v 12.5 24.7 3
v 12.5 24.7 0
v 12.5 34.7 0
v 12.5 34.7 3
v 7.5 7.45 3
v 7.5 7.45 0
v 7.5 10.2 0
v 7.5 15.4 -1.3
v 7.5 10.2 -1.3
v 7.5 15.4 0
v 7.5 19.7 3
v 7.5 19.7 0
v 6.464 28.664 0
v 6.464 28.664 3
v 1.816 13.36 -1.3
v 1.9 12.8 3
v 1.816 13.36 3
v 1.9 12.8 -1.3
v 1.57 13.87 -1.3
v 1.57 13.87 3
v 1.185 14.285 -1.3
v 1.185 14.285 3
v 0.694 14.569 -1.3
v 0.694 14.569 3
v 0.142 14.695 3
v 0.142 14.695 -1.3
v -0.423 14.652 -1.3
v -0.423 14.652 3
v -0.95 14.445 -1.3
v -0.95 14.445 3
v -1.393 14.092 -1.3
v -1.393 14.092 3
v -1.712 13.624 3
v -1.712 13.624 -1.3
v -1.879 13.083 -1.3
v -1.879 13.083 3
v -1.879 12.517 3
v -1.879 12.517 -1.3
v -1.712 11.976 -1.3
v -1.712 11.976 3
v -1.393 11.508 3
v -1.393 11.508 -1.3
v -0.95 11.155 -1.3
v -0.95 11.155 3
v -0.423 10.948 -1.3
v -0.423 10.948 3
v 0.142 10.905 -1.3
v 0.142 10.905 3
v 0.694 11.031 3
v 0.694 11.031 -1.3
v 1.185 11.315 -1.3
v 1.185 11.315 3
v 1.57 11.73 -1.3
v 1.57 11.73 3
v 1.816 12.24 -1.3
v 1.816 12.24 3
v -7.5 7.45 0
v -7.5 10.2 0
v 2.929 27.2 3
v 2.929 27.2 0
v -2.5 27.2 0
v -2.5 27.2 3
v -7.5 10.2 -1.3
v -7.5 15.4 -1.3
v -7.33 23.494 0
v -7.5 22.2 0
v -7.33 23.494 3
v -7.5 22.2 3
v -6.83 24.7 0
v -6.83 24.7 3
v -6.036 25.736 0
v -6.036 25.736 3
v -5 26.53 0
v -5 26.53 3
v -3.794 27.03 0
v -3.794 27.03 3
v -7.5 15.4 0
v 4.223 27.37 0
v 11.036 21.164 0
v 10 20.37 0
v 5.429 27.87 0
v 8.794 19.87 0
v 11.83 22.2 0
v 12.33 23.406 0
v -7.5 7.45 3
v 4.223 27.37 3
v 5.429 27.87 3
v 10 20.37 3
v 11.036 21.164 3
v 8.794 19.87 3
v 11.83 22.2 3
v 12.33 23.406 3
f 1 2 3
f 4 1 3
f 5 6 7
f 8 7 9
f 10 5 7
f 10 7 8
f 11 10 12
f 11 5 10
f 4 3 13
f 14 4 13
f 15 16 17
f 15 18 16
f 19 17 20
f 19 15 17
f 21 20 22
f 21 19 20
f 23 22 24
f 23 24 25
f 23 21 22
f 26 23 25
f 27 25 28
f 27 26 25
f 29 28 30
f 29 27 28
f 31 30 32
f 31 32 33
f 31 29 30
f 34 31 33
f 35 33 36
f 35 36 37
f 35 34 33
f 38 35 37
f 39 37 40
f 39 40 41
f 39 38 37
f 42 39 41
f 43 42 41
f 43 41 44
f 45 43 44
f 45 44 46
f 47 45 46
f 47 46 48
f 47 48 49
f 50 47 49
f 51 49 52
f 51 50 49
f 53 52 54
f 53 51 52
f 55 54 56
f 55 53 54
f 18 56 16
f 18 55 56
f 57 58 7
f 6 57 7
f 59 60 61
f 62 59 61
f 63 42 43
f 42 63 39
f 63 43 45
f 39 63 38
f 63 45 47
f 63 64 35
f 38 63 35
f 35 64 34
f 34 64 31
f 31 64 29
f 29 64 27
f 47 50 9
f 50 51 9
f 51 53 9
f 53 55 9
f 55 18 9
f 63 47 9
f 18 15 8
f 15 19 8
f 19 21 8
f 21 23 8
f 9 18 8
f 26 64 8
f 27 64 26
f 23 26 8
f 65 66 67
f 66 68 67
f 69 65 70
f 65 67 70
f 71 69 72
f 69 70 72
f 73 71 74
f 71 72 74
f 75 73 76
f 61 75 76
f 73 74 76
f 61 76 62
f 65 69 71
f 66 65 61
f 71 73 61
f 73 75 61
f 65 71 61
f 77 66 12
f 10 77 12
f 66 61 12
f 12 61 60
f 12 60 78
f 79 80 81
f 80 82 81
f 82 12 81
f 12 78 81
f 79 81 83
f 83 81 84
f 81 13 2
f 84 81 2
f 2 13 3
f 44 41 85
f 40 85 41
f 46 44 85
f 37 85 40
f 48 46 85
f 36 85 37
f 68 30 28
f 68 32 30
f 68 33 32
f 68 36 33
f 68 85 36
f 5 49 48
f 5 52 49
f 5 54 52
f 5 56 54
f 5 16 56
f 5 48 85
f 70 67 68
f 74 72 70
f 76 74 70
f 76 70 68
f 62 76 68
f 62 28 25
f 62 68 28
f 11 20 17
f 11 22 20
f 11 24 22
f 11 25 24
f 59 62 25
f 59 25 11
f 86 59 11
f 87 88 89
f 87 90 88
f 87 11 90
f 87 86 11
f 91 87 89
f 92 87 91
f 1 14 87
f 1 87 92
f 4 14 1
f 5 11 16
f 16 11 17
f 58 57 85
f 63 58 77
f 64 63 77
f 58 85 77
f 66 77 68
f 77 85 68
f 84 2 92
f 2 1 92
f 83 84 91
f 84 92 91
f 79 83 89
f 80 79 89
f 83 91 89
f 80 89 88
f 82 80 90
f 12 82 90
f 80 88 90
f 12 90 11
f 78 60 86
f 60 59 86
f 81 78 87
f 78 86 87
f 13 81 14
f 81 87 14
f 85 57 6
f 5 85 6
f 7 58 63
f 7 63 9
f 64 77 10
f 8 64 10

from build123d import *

# Parameters (mm, degrees)
F0_W     = 15
F0_H     = 2.75
F0_H_2   = 5.2
F0_R     = 1.9
F0_H_3   = 4.3
F1_DEPTH = 3
F2_DEPTH = 1.3
F3_R     = 4.99999


# Not quite as in the source:
# - a fillet or chamfer is up to 0.001 mm smaller than in the source, because OpenCascade refuses the exact size
# - a feature names something its author has since deleted; it is built from what else it names


with BuildPart() as f1:
    # F0 (on Top) → F1 (new body)
    with BuildSketch(Plane.XY):
        with Locations((0, 8.825)):
            Rectangle(F0_W, F0_H)
        with Locations((0, 12.8)):
            Rectangle(F0_W, F0_H_2)
        with Locations((0, 12.8)):
            Circle(F0_R, mode=Mode.SUBTRACT)
        with Locations((0, 17.55)):
            Rectangle(F0_W, F0_H_3)
        Polygon((-7.5, 27.2), (-7.5, 19.7), (7.5, 19.7), (12.5, 19.7), (12.5, 34.7), (5, 27.2), align=None)
    extrude(amount=F1_DEPTH)

    # F0 (on Top) → F2 (join)
    with BuildSketch(Plane.XY):
        with Locations((0, 12.8)):
            Rectangle(F0_W, F0_H_2)
        with Locations((0, 12.8)):
            Circle(F0_R, mode=Mode.SUBTRACT)
    extrude(amount=-F2_DEPTH)

    # F3 (radius 5 in the source; OpenCascade refuses exactly that, so slightly less here)
    f3_edges = [f1.edges().sort_by_distance(p)[0] for p in [
        (12.5, 19.7, 1.5),
        (-7.5, 27.2, 1.5),
        (5, 27.2, 1.5),
    ]]
    fillet(f3_edges, radius=F3_R)


solid = f1.part
